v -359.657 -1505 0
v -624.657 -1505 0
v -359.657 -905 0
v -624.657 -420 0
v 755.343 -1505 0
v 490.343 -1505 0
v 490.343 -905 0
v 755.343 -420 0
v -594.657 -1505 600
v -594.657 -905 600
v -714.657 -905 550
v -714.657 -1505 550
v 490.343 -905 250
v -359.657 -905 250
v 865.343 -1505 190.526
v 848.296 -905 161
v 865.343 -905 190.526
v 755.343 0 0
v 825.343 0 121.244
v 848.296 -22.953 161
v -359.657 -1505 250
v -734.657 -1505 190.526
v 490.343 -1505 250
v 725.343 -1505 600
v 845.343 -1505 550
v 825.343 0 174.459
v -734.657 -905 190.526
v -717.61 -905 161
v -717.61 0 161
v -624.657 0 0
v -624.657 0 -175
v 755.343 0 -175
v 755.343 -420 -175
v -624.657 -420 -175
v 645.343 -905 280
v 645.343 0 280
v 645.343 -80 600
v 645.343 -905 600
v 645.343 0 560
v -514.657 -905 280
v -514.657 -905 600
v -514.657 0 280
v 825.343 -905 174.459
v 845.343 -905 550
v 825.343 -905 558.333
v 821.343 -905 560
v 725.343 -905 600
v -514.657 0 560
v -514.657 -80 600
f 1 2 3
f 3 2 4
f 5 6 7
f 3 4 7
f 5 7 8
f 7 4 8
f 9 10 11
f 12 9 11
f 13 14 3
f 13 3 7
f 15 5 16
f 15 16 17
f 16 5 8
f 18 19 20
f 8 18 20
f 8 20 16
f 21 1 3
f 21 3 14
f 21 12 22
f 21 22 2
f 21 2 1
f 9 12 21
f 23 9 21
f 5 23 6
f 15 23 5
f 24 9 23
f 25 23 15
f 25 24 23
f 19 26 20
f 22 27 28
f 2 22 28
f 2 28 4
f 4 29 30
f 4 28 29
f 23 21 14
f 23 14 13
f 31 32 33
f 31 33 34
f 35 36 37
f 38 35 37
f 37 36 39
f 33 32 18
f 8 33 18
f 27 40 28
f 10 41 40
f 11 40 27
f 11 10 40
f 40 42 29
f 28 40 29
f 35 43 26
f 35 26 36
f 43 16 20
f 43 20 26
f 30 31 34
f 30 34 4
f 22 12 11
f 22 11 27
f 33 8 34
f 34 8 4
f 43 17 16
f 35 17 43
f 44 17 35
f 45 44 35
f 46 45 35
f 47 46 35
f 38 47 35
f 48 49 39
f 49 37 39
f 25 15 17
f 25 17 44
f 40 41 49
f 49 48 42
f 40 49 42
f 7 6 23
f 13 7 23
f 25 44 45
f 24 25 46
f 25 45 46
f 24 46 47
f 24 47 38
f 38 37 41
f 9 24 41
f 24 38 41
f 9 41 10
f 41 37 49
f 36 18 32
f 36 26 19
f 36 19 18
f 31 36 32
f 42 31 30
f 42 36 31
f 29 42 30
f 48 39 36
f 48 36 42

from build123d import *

# Parameters (mm, degrees)
F1_DEPTH      = 1505
F3_DEPTH      = 734.6581049648
F3_DEPTH_BACK = 865.3438950352
F5_DEPTH      = 600.001
F6_W          = 850
F6_H          = 250
F7_DEPTH      = 600
F9_DEPTH      = 905
F10_W         = 1380
F10_H         = 175
F11_DEPTH     = 420


with BuildPart() as f1:
    # F0 (on Front) → F1 (new body)
    with BuildSketch(Plane.XZ):
        Polygon((-734.6571049648, 190.5255888326), (-624.6571049648, 0), (755.3428950352, 0), (865.3428950352, 190.5255888326), (845.3428950352, 550), (725.3428950352, 600), (-594.6571049648, 600), (-714.6571049648, 550), align=None)
    extrude(amount=F1_DEPTH)

    # F2 (on Right) → F3 (cut, two sides)
    with BuildSketch(Plane.YZ) as f3_sk:
        Polygon((0, 600), (-80, 600), (0, 560), align=None)
    extrude(amount=-F3_DEPTH, mode=Mode.SUBTRACT)
    extrude(f3_sk.sketch, amount=F3_DEPTH_BACK, mode=Mode.SUBTRACT)

    # F4 (on face) → F5 (cut, through all)
    with BuildSketch(Plane.XY.offset(600)):
        Polygon((865.3428950352, 0), (825.3428950352, 0), (865.3428950352, -40), align=None)
    extrude(amount=-F5_DEPTH, mode=Mode.SUBTRACT)

    # F6 (on face) → F7 (cut)
    with BuildSketch(Plane.XZ.offset(1505)):
        with Locations((65.3428950352, 125)):
            Rectangle(F6_W, F6_H)
    extrude(amount=-F7_DEPTH, mode=Mode.SUBTRACT)

    # F8 (on face) → F9 (cut)
    with BuildSketch(Plane(origin=(0, 0, 0), x_dir=(-1, 0, 0), z_dir=(0, 1, 0))):
        Polygon((514.6571049648, 600), (514.6571049648, 560), (690.6571049648, 560), (594.6571049648, 600), align=None)
        Polygon((514.6571049648, 560), (514.6571049648, 280), (717.6104983043, 161), (734.6571049648, 190.5255888326), (714.6571049648, 550), (690.6571049648, 560), align=None)
        Polygon((-645.3428950352, 280), (-645.3428950352, 560), (-821.3428950352, 560), (-825.3428950352, 558.3333333333), (-825.3428950352, 174.4585274109), align=None)
        Polygon((-821.3428950352, 560), (-645.3428950352, 560), (-645.3428950352, 600), (-725.3428950352, 600), align=None)
        Polygon((-848.2962883747, 161), (-825.3428950352, 174.4585274109), (-825.3428950352, 558.3333333333), (-845.3428950352, 550), (-865.3428950352, 190.5255888326), align=None)
    extrude(amount=-F9_DEPTH, mode=Mode.SUBTRACT)

    # F10 (on face) → F11 (join)
    with BuildSketch(Plane(origin=(0, 0, 0), x_dir=(-1, 0, 0), z_dir=(0, 1, 0))):
        with Locations((-65.3428950352, -87.5)):
            Rectangle(F10_W, F10_H)
    extrude(amount=-F11_DEPTH)


solid = f1.part
